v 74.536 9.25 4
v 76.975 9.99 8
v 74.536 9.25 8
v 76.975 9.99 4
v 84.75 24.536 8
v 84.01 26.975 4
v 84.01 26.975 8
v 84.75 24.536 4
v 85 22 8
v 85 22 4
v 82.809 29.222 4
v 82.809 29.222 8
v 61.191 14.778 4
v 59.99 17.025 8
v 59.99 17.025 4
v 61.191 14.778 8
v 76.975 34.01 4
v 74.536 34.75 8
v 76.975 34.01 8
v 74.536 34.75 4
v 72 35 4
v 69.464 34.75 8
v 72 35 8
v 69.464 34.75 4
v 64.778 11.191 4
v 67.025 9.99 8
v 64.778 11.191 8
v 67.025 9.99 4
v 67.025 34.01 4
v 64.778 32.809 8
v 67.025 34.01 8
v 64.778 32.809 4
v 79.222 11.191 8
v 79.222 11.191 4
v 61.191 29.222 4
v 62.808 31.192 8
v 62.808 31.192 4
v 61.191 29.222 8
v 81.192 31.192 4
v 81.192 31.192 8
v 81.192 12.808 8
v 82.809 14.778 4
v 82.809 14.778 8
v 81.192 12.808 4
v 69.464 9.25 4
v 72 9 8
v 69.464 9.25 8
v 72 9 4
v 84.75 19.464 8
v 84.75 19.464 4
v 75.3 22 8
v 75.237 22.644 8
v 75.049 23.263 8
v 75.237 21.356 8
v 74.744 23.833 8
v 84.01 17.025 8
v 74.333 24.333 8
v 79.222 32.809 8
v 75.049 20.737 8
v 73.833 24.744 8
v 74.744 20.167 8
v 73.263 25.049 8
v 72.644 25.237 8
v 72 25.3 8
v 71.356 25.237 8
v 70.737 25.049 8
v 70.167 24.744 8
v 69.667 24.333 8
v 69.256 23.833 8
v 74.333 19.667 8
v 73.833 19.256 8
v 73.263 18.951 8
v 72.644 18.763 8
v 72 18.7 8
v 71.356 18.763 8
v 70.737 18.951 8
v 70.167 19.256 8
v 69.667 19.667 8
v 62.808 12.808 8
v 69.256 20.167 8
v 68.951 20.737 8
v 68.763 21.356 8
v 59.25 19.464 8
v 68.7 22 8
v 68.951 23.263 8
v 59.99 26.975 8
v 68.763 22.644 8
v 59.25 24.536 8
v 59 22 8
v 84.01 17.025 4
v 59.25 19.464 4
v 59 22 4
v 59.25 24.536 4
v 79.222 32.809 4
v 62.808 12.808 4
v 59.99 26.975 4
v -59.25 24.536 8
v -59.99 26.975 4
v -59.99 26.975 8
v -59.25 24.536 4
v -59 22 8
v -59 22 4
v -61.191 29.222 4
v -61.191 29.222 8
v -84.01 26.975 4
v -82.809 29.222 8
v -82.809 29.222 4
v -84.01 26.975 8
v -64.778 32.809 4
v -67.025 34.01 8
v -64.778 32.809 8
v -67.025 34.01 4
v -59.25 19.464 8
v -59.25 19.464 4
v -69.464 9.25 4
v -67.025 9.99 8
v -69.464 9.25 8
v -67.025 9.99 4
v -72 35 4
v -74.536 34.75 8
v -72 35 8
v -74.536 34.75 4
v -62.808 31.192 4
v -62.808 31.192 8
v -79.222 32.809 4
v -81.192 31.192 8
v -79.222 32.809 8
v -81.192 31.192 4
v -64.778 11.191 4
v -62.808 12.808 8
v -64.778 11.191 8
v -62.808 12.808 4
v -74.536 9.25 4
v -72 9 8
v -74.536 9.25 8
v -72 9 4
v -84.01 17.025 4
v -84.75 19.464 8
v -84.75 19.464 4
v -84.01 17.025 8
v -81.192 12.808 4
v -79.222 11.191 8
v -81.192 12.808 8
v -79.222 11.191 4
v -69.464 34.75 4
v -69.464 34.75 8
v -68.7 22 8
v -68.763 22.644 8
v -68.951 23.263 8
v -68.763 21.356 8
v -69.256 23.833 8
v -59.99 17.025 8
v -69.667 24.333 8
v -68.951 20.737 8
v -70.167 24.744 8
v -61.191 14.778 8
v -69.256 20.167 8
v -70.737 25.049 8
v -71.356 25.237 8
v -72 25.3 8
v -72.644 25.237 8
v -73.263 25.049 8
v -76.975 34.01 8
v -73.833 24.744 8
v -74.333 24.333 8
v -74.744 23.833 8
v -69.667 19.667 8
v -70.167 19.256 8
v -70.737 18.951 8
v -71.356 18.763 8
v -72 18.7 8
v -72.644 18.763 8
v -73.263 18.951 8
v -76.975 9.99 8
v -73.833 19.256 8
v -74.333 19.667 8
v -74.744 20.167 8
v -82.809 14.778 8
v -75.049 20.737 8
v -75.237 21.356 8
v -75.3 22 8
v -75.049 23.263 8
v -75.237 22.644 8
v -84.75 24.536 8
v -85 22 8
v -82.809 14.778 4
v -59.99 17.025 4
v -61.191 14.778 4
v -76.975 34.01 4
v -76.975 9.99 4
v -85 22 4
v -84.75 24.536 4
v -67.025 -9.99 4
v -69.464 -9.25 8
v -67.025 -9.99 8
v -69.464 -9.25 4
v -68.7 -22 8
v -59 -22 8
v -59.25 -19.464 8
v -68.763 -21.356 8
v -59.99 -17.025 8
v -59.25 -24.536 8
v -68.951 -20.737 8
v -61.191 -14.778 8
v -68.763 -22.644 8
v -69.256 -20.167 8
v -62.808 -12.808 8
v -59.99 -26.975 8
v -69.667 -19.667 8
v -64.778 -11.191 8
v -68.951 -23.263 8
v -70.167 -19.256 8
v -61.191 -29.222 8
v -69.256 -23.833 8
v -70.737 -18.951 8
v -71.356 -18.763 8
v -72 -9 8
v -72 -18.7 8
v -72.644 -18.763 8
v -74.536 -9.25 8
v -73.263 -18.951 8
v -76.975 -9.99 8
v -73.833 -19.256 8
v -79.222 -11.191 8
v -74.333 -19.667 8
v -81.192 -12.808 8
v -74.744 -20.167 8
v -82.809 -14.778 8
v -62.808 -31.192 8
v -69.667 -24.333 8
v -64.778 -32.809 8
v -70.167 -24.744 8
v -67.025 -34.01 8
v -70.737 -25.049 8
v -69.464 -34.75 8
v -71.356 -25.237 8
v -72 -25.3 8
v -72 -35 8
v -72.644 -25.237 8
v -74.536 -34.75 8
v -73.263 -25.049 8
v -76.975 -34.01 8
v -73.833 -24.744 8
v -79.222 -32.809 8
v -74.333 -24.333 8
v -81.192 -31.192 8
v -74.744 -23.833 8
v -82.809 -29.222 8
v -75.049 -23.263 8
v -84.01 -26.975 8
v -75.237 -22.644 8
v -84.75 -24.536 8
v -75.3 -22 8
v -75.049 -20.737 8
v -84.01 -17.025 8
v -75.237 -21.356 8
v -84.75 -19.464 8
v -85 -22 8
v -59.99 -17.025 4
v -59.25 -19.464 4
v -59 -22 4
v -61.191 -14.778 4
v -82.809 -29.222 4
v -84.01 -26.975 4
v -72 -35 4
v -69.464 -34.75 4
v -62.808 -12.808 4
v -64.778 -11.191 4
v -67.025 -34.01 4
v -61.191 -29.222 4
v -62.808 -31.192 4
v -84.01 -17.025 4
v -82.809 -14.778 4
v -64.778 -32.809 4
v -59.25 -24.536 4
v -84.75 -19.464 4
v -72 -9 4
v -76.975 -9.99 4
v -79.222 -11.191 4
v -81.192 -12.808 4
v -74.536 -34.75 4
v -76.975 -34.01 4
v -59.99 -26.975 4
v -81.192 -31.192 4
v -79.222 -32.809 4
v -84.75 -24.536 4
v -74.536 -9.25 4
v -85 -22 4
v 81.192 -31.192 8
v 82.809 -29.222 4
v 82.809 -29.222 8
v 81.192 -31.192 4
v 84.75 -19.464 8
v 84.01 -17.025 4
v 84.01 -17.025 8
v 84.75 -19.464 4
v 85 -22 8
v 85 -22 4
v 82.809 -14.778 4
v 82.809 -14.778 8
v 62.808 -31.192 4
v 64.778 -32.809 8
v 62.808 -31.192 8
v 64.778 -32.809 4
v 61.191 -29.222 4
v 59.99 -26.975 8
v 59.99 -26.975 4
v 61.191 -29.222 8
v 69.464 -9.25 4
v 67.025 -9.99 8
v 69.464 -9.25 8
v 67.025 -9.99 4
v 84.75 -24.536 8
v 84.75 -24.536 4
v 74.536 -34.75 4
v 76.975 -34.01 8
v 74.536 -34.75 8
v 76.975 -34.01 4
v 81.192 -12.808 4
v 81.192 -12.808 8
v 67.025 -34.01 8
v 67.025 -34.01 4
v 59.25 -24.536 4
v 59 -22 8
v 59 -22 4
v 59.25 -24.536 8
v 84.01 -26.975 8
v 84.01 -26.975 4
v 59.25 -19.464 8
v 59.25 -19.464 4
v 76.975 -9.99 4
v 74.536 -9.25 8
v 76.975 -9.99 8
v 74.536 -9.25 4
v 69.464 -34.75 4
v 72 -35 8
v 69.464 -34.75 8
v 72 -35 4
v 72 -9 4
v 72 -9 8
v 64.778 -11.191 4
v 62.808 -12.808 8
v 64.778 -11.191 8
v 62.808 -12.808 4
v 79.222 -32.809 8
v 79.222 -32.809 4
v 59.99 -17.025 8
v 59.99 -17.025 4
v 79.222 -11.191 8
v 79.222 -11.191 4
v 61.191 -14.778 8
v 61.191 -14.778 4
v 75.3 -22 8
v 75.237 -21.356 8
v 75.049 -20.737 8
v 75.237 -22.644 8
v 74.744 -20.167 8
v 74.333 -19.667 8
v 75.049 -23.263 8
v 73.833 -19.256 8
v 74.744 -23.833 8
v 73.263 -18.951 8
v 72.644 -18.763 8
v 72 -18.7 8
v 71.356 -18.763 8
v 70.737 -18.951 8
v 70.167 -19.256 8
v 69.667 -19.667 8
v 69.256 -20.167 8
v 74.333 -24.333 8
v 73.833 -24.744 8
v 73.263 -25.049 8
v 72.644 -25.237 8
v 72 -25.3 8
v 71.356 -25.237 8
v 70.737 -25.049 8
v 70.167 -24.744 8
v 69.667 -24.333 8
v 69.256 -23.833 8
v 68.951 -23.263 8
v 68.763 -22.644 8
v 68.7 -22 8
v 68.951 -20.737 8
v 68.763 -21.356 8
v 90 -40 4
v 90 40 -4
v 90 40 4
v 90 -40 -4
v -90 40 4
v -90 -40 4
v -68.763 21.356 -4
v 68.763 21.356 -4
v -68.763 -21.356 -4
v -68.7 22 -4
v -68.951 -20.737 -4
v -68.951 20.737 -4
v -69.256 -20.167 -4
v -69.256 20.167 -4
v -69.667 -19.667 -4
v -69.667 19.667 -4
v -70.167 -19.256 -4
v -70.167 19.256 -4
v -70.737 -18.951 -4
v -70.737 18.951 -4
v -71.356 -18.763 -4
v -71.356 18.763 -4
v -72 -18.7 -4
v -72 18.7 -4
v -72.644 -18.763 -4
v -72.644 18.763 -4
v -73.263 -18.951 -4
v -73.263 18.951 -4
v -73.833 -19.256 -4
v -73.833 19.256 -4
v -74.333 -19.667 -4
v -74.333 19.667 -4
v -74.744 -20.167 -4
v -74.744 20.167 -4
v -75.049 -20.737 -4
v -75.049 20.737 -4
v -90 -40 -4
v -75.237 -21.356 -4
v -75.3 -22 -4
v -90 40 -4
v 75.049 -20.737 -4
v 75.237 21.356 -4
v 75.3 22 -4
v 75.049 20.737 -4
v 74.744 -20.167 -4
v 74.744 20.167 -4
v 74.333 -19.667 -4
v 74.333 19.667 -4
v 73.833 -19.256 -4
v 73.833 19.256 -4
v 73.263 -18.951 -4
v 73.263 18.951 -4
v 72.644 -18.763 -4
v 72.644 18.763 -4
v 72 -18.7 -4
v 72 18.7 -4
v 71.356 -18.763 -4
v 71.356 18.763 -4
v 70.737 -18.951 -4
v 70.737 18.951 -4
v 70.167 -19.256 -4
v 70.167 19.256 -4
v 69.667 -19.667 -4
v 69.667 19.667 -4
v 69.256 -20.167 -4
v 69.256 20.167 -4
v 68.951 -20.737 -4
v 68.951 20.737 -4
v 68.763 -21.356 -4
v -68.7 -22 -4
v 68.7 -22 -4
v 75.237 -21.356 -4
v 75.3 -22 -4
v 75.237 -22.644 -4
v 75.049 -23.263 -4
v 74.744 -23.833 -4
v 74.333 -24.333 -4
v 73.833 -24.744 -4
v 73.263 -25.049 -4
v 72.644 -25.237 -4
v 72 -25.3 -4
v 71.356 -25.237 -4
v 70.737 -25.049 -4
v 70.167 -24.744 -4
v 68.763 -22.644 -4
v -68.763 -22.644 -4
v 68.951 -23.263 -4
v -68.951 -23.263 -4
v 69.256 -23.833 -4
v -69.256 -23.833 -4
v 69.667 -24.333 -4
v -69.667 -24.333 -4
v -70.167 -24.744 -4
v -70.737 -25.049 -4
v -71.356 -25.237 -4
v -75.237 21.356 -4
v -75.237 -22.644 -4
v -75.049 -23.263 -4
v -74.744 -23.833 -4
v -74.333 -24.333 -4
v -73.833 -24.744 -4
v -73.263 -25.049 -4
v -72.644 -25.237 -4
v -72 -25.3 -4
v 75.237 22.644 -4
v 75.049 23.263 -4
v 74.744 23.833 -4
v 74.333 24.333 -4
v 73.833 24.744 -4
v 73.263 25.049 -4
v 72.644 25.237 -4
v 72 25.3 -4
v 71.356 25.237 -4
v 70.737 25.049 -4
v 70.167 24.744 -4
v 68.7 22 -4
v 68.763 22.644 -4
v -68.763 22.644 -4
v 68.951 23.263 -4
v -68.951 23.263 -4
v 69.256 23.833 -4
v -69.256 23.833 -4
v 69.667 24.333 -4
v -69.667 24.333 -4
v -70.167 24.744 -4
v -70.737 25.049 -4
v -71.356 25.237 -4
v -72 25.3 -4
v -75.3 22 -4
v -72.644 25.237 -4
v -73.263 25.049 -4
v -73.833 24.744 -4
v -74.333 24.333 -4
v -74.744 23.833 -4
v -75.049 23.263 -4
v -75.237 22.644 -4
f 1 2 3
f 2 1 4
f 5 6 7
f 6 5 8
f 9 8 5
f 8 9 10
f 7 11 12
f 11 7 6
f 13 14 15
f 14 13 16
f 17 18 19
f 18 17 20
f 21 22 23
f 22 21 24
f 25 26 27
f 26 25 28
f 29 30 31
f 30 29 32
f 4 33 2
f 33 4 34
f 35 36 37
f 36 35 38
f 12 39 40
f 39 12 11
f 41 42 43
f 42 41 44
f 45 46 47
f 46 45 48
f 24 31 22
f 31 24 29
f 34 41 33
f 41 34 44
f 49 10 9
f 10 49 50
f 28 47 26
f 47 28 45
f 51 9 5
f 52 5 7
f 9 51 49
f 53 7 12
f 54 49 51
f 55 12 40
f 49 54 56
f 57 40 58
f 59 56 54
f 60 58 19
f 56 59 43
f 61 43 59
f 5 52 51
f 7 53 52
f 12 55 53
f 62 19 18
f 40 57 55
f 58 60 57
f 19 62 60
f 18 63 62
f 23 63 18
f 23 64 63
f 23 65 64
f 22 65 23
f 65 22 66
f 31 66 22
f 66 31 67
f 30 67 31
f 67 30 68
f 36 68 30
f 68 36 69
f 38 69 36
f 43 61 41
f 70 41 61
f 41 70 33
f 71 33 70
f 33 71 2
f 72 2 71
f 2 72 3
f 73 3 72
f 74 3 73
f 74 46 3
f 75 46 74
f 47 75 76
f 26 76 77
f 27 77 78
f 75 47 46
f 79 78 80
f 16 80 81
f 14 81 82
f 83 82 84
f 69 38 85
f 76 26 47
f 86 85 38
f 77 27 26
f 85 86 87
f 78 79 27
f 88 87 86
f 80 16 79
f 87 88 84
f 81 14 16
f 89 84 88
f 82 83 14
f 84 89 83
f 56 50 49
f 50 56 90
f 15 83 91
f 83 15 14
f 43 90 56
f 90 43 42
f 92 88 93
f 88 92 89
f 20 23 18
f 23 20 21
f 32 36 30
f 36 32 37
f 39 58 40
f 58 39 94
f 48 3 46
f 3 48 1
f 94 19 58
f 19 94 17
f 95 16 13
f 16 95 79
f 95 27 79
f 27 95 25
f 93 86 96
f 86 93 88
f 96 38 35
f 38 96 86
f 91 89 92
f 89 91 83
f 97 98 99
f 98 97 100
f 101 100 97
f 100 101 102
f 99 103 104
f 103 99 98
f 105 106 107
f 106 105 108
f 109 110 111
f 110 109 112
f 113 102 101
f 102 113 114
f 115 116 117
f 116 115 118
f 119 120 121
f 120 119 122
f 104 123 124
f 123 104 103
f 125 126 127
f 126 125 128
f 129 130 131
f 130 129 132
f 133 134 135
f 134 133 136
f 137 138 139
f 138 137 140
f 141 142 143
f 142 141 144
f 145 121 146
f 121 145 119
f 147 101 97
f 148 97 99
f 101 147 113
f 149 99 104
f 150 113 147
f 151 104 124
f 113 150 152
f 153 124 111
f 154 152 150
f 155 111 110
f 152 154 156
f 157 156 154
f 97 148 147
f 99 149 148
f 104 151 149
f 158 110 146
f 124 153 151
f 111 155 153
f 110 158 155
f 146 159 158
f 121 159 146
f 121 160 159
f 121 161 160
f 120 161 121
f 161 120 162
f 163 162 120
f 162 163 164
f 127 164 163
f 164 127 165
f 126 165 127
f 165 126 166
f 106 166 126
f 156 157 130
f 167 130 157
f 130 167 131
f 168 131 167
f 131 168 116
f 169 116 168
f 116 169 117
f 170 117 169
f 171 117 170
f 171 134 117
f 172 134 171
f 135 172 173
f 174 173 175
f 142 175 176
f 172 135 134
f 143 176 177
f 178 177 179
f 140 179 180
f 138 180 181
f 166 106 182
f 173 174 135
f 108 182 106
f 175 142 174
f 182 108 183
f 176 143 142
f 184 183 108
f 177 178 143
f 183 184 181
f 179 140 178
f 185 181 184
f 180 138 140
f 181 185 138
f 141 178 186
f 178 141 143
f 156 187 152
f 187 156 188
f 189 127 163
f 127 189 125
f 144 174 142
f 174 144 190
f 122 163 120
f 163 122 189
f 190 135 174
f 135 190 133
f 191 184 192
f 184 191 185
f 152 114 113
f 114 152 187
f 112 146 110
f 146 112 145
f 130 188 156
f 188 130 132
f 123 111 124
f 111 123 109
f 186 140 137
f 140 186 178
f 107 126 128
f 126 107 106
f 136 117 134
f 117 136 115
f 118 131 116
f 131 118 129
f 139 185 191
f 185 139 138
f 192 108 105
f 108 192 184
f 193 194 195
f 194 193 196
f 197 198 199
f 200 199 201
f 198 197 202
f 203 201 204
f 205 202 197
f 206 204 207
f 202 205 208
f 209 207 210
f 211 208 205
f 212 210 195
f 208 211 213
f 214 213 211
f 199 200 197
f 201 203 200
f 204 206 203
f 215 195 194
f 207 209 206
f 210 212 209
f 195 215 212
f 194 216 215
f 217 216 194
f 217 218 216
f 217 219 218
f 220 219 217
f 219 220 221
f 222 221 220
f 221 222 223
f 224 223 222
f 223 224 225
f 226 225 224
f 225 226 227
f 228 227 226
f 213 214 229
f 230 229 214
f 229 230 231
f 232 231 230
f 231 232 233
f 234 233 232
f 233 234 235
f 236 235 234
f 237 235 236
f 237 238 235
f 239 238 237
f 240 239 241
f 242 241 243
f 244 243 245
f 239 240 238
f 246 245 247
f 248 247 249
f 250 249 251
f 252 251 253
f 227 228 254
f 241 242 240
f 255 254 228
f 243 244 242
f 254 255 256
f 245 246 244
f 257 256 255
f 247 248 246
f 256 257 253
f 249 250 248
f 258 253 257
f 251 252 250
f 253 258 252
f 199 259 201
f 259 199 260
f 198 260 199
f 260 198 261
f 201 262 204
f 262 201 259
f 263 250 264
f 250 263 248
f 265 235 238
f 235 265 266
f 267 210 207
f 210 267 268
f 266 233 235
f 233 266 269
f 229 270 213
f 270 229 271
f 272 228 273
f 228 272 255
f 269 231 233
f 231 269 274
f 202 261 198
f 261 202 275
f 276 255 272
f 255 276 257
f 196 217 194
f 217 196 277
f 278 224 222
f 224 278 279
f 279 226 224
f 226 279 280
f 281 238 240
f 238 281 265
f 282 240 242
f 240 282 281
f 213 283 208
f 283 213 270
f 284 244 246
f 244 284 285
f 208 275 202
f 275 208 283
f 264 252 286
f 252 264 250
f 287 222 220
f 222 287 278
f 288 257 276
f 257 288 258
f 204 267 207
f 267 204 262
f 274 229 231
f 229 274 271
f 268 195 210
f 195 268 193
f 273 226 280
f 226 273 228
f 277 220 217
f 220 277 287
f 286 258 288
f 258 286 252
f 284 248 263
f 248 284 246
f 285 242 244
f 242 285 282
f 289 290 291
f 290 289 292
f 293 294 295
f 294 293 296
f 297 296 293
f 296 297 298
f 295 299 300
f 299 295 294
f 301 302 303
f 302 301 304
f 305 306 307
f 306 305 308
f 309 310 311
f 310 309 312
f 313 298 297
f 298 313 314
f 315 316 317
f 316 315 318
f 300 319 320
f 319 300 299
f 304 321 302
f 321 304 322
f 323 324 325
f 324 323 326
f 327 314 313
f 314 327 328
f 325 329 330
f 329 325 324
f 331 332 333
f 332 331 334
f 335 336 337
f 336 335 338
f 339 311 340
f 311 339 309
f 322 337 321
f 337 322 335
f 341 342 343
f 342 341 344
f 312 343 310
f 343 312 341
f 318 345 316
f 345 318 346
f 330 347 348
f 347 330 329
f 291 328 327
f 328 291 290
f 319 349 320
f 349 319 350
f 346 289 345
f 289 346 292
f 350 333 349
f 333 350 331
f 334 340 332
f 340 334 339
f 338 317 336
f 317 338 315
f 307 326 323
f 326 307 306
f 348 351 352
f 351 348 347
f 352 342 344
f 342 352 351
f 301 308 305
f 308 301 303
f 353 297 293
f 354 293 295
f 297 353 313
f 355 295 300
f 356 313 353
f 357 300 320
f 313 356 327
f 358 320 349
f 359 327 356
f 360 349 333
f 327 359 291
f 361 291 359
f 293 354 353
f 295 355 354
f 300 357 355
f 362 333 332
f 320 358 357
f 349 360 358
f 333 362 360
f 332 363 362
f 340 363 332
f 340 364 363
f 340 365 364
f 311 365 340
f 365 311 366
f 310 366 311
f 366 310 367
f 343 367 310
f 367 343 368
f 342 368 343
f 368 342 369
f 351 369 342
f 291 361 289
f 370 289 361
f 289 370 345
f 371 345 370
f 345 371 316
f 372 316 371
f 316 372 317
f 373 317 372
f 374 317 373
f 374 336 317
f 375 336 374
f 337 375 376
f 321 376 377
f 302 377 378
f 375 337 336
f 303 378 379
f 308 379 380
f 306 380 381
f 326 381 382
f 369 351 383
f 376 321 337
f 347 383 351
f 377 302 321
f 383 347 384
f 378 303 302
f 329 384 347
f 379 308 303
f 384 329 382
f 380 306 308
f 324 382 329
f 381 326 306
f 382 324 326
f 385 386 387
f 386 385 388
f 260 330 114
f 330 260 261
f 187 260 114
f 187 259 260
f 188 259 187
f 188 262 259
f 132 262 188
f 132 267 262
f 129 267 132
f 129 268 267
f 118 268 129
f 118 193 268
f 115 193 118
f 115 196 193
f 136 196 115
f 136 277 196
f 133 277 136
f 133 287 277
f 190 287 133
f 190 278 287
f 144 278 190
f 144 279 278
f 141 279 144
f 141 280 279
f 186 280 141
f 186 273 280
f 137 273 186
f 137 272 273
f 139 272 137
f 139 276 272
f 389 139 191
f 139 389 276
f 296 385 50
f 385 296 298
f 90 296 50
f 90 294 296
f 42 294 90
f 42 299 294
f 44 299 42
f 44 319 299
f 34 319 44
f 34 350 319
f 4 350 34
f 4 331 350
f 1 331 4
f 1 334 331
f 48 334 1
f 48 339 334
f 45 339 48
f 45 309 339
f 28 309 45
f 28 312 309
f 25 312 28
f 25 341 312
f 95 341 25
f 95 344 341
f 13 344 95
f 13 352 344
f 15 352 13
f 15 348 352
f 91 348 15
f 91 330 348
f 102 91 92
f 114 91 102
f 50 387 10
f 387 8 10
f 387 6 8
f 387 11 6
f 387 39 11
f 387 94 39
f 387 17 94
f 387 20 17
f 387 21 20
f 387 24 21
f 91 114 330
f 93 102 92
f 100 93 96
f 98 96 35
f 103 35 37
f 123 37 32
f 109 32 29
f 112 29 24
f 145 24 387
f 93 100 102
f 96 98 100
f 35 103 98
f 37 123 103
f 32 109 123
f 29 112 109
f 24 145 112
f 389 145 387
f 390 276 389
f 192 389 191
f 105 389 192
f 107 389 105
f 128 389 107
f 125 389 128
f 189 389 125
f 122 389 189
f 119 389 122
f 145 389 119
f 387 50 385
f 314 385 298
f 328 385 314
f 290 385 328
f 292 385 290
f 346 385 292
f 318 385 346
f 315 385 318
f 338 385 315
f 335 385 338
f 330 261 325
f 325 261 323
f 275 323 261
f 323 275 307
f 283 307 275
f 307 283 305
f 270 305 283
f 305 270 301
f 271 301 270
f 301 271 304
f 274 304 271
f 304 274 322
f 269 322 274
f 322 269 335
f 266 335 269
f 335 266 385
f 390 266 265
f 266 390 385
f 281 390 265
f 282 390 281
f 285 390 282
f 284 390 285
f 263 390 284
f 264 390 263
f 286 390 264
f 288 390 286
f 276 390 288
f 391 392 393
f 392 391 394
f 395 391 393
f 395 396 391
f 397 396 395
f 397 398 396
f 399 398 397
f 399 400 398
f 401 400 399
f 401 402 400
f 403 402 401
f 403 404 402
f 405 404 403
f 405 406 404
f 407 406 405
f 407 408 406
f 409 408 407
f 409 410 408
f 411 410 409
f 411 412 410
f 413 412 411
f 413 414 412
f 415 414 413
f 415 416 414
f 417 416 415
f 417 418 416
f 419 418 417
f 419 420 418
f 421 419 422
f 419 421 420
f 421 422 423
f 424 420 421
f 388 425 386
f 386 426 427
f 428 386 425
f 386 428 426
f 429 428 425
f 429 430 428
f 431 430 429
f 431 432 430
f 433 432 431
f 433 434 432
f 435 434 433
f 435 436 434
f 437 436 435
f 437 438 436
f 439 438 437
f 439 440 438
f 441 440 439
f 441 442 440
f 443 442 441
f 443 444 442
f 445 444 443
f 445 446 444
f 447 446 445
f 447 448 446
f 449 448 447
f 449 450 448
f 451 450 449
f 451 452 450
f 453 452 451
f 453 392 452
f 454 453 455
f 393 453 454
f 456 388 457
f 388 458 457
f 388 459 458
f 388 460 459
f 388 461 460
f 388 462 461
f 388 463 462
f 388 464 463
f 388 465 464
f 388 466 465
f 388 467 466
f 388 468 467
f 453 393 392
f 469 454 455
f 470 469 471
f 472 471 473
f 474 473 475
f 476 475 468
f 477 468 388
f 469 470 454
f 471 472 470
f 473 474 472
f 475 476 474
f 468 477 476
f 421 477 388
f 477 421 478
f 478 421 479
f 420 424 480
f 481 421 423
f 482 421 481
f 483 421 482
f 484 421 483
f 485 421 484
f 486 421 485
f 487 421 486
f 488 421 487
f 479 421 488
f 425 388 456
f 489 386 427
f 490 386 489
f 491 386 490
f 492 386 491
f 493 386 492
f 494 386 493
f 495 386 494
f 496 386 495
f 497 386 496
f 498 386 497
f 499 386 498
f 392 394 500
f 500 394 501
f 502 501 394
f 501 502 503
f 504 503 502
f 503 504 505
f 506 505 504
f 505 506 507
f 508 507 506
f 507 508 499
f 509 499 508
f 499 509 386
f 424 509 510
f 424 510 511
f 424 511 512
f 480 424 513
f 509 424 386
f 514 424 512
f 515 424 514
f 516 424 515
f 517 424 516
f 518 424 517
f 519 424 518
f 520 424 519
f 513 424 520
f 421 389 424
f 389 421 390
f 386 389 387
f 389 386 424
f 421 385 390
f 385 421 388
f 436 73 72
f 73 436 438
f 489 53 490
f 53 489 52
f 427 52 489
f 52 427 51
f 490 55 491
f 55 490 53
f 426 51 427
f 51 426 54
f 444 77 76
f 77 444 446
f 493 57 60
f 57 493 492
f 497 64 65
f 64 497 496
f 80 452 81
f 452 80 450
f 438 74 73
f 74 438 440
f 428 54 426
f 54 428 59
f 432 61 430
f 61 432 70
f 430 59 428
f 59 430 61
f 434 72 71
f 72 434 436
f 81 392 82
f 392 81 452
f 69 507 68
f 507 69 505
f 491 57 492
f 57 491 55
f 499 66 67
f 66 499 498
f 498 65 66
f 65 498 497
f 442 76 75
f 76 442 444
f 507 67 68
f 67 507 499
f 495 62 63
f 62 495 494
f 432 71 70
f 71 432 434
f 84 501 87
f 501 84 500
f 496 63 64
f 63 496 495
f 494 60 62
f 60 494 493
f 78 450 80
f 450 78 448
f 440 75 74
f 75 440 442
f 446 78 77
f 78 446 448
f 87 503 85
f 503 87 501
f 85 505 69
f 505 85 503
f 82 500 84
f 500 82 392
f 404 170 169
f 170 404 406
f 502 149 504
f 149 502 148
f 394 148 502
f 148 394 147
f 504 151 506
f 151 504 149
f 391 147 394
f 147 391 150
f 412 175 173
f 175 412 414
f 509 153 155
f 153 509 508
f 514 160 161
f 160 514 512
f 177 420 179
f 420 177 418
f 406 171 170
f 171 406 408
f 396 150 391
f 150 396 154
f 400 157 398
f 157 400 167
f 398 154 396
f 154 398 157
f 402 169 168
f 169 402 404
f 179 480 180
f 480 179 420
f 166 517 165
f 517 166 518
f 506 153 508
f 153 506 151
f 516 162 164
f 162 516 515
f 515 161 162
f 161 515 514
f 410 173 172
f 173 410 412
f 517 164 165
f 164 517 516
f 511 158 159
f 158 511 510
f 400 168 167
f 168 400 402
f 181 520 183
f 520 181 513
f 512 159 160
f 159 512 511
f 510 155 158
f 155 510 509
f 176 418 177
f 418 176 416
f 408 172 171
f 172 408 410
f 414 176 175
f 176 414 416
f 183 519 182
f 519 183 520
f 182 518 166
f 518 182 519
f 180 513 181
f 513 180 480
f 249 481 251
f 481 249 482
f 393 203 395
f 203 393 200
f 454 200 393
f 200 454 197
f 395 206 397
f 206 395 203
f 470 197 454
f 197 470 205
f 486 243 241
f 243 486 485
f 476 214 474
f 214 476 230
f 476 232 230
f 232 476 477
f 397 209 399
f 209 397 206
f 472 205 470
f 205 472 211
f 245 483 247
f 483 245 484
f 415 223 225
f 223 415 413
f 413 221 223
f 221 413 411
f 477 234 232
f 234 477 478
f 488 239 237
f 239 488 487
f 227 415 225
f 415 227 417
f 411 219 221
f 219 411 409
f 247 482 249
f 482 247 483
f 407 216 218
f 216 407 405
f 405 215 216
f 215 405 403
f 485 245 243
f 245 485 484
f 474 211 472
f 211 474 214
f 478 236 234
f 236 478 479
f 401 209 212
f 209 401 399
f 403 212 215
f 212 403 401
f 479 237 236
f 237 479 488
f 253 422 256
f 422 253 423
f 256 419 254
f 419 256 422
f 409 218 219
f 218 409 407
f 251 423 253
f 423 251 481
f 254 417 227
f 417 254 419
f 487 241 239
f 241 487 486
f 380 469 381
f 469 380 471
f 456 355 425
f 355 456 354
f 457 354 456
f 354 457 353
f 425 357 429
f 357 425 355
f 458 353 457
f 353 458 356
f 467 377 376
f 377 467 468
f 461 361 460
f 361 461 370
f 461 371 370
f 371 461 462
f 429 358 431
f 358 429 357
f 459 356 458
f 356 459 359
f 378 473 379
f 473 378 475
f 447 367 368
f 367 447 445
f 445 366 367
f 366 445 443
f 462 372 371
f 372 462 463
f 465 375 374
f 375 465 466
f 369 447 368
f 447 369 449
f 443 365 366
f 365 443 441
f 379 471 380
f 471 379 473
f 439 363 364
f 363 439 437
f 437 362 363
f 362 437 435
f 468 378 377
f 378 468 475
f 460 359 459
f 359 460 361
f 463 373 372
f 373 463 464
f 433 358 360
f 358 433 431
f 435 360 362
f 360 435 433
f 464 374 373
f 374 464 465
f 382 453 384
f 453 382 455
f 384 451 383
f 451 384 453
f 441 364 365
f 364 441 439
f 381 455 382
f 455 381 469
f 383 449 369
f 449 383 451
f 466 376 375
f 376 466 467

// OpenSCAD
$fn = 32;

// ----------------------------------------------------------------------
// Anchor pads 180 x 80 x 12
// four corner bosses with anchor holes
// ----------------------------------------------------------------------

// --- parameters (mm) ---
plate = [180, 80, 8];  // base plate size (x, y, z)
pads = 4;              // boss count, one per corner
edge = 18;             // boss centre offset from the plate edge
boss_d = 26;           // boss diameter
boss_h = 4;            // boss height above the base plate
hole_d = 6.6;          // hole diameter

// --- derived feature positions (mm) ---
height = plate[2] + boss_h;      // = 12   overall height of the part
corner_x = plate[0] / 2 - edge;  // = 72   boss centre X
corner_y = plate[1] / 2 - edge;  // = 22   boss centre Y
feature_centers = [
  [corner_x, corner_y],
  [-corner_x, corner_y],
  [-corner_x, -corner_y],
  [corner_x, -corner_y]
];   // boss centres, anchor holes are drilled there

// base plate, four bosses standing on it, anchor holes all the way through
difference() {
  union() {
    cube(plate, center = true);
    for (centre = feature_centers)
      translate([centre[0], centre[1], plate[2] / 2 - 1])
        cylinder(d = boss_d, h = boss_h + 1);
  }
  for (centre = feature_centers)
    translate([centre[0], centre[1], -height])
      cylinder(d = hole_d, h = 2 * height + 2);  // through boss and plate
}
